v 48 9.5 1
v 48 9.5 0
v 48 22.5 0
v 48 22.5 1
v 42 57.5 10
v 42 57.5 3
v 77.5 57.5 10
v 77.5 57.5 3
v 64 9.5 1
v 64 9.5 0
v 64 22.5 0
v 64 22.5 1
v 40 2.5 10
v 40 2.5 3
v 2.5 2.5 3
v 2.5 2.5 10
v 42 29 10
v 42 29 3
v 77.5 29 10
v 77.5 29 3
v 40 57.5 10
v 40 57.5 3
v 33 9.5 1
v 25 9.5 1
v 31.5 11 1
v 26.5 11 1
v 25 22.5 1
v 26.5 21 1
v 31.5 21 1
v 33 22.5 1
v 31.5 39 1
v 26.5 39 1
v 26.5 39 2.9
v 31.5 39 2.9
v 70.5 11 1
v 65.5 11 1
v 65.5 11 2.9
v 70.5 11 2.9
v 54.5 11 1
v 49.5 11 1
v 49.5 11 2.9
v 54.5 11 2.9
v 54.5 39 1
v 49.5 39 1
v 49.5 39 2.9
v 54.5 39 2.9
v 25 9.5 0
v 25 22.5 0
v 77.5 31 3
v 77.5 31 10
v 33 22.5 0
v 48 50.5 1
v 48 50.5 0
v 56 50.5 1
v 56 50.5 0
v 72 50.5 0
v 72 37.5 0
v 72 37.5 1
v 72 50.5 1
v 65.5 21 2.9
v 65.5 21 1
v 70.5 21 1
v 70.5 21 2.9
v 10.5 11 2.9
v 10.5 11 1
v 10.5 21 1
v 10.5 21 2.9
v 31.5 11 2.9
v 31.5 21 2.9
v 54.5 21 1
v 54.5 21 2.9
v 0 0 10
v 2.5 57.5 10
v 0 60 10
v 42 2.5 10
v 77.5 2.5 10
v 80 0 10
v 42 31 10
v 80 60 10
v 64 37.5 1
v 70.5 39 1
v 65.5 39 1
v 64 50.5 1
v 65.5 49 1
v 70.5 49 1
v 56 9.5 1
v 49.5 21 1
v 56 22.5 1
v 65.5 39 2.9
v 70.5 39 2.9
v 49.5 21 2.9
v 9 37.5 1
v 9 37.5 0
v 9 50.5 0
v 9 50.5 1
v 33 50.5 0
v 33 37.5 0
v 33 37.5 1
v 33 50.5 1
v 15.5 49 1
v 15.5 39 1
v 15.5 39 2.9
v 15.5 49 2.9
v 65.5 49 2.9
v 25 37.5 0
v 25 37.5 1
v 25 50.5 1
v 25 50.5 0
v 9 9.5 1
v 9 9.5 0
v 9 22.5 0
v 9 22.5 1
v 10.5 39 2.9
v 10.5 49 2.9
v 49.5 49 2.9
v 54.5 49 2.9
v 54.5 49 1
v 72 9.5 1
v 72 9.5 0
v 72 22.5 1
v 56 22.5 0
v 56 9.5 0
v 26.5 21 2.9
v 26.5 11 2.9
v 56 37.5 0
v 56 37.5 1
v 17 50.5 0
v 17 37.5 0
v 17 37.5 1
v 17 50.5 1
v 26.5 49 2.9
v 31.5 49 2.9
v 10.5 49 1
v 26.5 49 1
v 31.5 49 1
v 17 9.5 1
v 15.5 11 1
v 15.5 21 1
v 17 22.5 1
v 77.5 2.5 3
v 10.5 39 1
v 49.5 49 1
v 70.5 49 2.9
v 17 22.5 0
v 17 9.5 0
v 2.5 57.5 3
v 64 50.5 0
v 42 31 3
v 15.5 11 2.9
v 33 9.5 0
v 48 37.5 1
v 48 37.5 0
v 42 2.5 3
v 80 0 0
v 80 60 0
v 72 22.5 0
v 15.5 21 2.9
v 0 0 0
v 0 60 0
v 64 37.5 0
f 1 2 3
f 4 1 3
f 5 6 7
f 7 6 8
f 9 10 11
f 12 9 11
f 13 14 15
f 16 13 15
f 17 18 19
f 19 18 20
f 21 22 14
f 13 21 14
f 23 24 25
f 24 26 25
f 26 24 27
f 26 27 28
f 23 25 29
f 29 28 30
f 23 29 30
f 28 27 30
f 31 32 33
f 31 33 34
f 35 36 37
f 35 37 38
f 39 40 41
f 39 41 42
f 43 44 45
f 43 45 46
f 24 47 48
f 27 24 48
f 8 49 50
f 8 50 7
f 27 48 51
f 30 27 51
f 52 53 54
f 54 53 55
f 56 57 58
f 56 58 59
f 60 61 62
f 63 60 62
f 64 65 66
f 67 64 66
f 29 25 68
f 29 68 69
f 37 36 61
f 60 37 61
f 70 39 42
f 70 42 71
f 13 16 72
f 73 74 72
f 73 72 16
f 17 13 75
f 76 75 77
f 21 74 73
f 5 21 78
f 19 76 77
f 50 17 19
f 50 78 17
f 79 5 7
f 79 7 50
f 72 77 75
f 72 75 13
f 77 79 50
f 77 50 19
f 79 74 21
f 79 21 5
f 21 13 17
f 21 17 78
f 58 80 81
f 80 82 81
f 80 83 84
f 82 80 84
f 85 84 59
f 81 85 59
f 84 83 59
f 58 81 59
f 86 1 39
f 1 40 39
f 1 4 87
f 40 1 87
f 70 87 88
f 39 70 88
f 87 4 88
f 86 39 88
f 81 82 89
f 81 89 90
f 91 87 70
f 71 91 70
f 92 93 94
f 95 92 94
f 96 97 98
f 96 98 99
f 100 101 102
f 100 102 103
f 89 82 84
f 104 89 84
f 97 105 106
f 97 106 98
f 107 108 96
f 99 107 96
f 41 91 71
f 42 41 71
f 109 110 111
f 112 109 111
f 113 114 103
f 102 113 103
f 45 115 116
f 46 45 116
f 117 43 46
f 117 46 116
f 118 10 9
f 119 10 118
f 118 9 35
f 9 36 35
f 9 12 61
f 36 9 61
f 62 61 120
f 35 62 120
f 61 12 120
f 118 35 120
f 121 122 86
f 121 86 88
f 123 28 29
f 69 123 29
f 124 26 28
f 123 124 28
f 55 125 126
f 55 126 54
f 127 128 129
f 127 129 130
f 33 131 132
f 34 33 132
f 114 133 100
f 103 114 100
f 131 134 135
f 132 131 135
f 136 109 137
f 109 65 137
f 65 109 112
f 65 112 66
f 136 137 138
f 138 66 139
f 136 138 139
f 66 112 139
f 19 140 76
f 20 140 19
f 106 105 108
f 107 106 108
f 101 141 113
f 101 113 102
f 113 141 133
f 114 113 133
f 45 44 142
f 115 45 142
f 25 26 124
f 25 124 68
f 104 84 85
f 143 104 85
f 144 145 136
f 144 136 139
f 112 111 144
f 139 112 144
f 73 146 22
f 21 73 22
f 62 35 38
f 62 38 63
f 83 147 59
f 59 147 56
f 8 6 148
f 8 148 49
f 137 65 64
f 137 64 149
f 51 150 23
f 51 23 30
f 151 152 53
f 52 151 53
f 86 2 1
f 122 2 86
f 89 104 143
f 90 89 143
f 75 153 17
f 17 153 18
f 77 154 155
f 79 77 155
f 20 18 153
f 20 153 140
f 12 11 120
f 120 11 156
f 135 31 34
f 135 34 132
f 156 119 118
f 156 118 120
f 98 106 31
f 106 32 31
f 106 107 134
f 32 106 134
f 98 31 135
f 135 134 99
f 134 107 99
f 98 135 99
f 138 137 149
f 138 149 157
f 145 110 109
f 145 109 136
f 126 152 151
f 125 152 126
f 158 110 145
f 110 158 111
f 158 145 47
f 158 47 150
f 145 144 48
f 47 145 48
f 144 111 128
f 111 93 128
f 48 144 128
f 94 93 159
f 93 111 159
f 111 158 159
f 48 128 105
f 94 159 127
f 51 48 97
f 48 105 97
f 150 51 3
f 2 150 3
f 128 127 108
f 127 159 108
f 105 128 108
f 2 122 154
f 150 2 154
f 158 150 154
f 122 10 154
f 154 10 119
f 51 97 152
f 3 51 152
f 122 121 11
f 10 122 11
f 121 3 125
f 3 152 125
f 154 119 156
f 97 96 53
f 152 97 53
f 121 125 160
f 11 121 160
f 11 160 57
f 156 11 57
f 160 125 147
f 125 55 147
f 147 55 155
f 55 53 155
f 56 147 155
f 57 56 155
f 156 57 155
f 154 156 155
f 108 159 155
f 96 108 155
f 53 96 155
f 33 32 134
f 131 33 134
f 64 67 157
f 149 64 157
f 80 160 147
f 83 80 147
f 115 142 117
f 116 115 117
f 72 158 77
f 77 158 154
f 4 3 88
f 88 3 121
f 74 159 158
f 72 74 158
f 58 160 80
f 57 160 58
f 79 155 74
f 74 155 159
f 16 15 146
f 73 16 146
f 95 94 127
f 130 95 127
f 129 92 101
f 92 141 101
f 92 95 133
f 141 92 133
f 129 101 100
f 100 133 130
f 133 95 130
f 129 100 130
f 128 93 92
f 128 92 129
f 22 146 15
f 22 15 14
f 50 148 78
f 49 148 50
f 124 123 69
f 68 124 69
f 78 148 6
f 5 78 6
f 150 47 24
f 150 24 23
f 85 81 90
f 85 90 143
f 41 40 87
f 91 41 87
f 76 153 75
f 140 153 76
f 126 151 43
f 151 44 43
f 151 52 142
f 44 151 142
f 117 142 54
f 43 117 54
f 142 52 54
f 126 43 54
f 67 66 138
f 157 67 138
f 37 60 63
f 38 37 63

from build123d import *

# Parameters (mm, degrees)
F0_W     = 35.5
F0_H     = 26.5
F1_DEPTH = 10
F0_W_2   = 37.5
F0_H_2   = 27.5
F0_W_3   = 8.0000035167
F0_H_3   = 13.0000035167
F0_W_4   = 8
F0_H_4   = 13
F0_W_5   = 5
F0_H_5   = 10
F2_DEPTH = 3
F3_DEPTH = 1
F4_DEPTH = 2.9


with BuildPart() as f1:
    # F0 (on Top) → F1 (new body)
    with BuildSketch(Plane.XY):
        Polygon((0, 30), (0, 0), (80, 0), (80, 60), (0, 60), align=None)
        with Locations((59.75, 15.75)):
            Rectangle(F0_W, F0_H, mode=Mode.SUBTRACT)
        Polygon((2.5, 57.5), (40, 57.5), (40, 30), (40, 2.5), (2.5, 2.5), (2.5, 30), align=None, mode=Mode.SUBTRACT)
        with Locations((59.75, 44.25)):
            Rectangle(F0_W, F0_H, mode=Mode.SUBTRACT)
    extrude(amount=F1_DEPTH)

    # F0 (on Top) → F2 (join)
    with BuildSketch(Plane.XY):
        with Locations((21.25, 43.75)):
            Rectangle(F0_W_2, F0_H_2)
        with Locations((13, 44)):
            Rectangle(F0_W_3, F0_H_3, mode=Mode.SUBTRACT)
        with Locations((29, 44)):
            Rectangle(F0_W_3, F0_H_3, mode=Mode.SUBTRACT)
        with Locations((21.25, 16.25)):
            Rectangle(F0_W_2, F0_H_2)
        with Locations((13, 16)):
            Rectangle(F0_W_3, F0_H_3, mode=Mode.SUBTRACT)
        with Locations((29, 16)):
            Rectangle(F0_W_3, F0_H_3, mode=Mode.SUBTRACT)
        with Locations((59.75, 44.25)):
            Rectangle(F0_W, F0_H)
        with Locations((52, 44)):
            Rectangle(F0_W_4, F0_H_4, mode=Mode.SUBTRACT)
        with Locations((68, 44)):
            Rectangle(F0_W_4, F0_H_4, mode=Mode.SUBTRACT)
        with Locations((59.75, 15.75)):
            Rectangle(F0_W, F0_H)
        with Locations((52, 16)):
            Rectangle(F0_W_4, F0_H_4, mode=Mode.SUBTRACT)
        with Locations((68, 16)):
            Rectangle(F0_W_4, F0_H_4, mode=Mode.SUBTRACT)
        with Locations((13, 44)):
            Rectangle(F0_W_3, F0_H_3)
        with Locations((13, 44)):
            Rectangle(F0_W_5, F0_H_5, mode=Mode.SUBTRACT)
        with Locations((29, 44)):
            Rectangle(F0_W_3, F0_H_3)
        with Locations((29, 44)):
            Rectangle(F0_W_5, F0_H_5, mode=Mode.SUBTRACT)
        with Locations((29, 16)):
            Rectangle(F0_W_3, F0_H_3)
        with Locations((29, 16)):
            Rectangle(F0_W_5, F0_H_5, mode=Mode.SUBTRACT)
        with Locations((13, 16)):
            Rectangle(F0_W_3, F0_H_3)
        with Locations((13, 16)):
            Rectangle(F0_W_5, F0_H_5, mode=Mode.SUBTRACT)
        with Locations((52, 44)):
            Rectangle(F0_W_4, F0_H_4)
        with Locations((52, 44)):
            Rectangle(F0_W_5, F0_H_5, mode=Mode.SUBTRACT)
        with Locations((68, 44)):
            Rectangle(F0_W_4, F0_H_4)
        with Locations((68, 44)):
            Rectangle(F0_W_5, F0_H_5, mode=Mode.SUBTRACT)
        with Locations((68, 16)):
            Rectangle(F0_W_4, F0_H_4)
        with Locations((68, 16)):
            Rectangle(F0_W_5, F0_H_5, mode=Mode.SUBTRACT)
        with Locations((52, 16)):
            Rectangle(F0_W_4, F0_H_4)
        with Locations((52, 16)):
            Rectangle(F0_W_5, F0_H_5, mode=Mode.SUBTRACT)
        with Locations((13, 44)):
            Rectangle(F0_W_5, F0_H_5)
        with Locations((29, 44)):
            Rectangle(F0_W_5, F0_H_5)
        with Locations((52, 44)):
            Rectangle(F0_W_5, F0_H_5)
        with Locations((68, 44)):
            Rectangle(F0_W_5, F0_H_5)
        with Locations((68, 16)):
            Rectangle(F0_W_5, F0_H_5)
        with Locations((52, 16)):
            Rectangle(F0_W_5, F0_H_5)
        with Locations((29, 16)):
            Rectangle(F0_W_5, F0_H_5)
        with Locations((13, 16)):
            Rectangle(F0_W_5, F0_H_5)
    extrude(amount=F2_DEPTH)

    # F0 (on Top) → F3 (cut)
    with BuildSketch(Plane.XY):
        with Locations((68, 44)):
            Rectangle(F0_W_4, F0_H_4)
        with Locations((68, 44)):
            Rectangle(F0_W_5, F0_H_5, mode=Mode.SUBTRACT)
        with Locations((52, 44)):
            Rectangle(F0_W_4, F0_H_4)
        with Locations((52, 44)):
            Rectangle(F0_W_5, F0_H_5, mode=Mode.SUBTRACT)
        with Locations((52, 16)):
            Rectangle(F0_W_4, F0_H_4)
        with Locations((52, 16)):
            Rectangle(F0_W_5, F0_H_5, mode=Mode.SUBTRACT)
        with Locations((68, 16)):
            Rectangle(F0_W_4, F0_H_4)
        with Locations((68, 16)):
            Rectangle(F0_W_5, F0_H_5, mode=Mode.SUBTRACT)
        with Locations((29, 44)):
            Rectangle(F0_W_3, F0_H_3)
        with Locations((29, 44)):
            Rectangle(F0_W_5, F0_H_5, mode=Mode.SUBTRACT)
        with Locations((13, 44)):
            Rectangle(F0_W_3, F0_H_3)
        with Locations((13, 44)):
            Rectangle(F0_W_5, F0_H_5, mode=Mode.SUBTRACT)
        with Locations((13, 16)):
            Rectangle(F0_W_3, F0_H_3)
        with Locations((13, 16)):
            Rectangle(F0_W_5, F0_H_5, mode=Mode.SUBTRACT)
        with Locations((29, 16)):
            Rectangle(F0_W_3, F0_H_3)
        with Locations((29, 16)):
            Rectangle(F0_W_5, F0_H_5, mode=Mode.SUBTRACT)
    extrude(amount=F3_DEPTH, mode=Mode.SUBTRACT)

    # F0 (on Top) → F4 (cut)
    with BuildSketch(Plane.XY):
        with Locations((68, 44)):
            Rectangle(F0_W_5, F0_H_5)
        with Locations((52, 44)):
            Rectangle(F0_W_5, F0_H_5)
        with Locations((29, 44)):
            Rectangle(F0_W_5, F0_H_5)
        with Locations((13, 44)):
            Rectangle(F0_W_5, F0_H_5)
        with Locations((13, 16)):
            Rectangle(F0_W_5, F0_H_5)
        with Locations((29, 16)):
            Rectangle(F0_W_5, F0_H_5)
        with Locations((52, 16)):
            Rectangle(F0_W_5, F0_H_5)
        with Locations((68, 16)):
            Rectangle(F0_W_5, F0_H_5)
    extrude(amount=F4_DEPTH, mode=Mode.SUBTRACT)


solid = f1.part
